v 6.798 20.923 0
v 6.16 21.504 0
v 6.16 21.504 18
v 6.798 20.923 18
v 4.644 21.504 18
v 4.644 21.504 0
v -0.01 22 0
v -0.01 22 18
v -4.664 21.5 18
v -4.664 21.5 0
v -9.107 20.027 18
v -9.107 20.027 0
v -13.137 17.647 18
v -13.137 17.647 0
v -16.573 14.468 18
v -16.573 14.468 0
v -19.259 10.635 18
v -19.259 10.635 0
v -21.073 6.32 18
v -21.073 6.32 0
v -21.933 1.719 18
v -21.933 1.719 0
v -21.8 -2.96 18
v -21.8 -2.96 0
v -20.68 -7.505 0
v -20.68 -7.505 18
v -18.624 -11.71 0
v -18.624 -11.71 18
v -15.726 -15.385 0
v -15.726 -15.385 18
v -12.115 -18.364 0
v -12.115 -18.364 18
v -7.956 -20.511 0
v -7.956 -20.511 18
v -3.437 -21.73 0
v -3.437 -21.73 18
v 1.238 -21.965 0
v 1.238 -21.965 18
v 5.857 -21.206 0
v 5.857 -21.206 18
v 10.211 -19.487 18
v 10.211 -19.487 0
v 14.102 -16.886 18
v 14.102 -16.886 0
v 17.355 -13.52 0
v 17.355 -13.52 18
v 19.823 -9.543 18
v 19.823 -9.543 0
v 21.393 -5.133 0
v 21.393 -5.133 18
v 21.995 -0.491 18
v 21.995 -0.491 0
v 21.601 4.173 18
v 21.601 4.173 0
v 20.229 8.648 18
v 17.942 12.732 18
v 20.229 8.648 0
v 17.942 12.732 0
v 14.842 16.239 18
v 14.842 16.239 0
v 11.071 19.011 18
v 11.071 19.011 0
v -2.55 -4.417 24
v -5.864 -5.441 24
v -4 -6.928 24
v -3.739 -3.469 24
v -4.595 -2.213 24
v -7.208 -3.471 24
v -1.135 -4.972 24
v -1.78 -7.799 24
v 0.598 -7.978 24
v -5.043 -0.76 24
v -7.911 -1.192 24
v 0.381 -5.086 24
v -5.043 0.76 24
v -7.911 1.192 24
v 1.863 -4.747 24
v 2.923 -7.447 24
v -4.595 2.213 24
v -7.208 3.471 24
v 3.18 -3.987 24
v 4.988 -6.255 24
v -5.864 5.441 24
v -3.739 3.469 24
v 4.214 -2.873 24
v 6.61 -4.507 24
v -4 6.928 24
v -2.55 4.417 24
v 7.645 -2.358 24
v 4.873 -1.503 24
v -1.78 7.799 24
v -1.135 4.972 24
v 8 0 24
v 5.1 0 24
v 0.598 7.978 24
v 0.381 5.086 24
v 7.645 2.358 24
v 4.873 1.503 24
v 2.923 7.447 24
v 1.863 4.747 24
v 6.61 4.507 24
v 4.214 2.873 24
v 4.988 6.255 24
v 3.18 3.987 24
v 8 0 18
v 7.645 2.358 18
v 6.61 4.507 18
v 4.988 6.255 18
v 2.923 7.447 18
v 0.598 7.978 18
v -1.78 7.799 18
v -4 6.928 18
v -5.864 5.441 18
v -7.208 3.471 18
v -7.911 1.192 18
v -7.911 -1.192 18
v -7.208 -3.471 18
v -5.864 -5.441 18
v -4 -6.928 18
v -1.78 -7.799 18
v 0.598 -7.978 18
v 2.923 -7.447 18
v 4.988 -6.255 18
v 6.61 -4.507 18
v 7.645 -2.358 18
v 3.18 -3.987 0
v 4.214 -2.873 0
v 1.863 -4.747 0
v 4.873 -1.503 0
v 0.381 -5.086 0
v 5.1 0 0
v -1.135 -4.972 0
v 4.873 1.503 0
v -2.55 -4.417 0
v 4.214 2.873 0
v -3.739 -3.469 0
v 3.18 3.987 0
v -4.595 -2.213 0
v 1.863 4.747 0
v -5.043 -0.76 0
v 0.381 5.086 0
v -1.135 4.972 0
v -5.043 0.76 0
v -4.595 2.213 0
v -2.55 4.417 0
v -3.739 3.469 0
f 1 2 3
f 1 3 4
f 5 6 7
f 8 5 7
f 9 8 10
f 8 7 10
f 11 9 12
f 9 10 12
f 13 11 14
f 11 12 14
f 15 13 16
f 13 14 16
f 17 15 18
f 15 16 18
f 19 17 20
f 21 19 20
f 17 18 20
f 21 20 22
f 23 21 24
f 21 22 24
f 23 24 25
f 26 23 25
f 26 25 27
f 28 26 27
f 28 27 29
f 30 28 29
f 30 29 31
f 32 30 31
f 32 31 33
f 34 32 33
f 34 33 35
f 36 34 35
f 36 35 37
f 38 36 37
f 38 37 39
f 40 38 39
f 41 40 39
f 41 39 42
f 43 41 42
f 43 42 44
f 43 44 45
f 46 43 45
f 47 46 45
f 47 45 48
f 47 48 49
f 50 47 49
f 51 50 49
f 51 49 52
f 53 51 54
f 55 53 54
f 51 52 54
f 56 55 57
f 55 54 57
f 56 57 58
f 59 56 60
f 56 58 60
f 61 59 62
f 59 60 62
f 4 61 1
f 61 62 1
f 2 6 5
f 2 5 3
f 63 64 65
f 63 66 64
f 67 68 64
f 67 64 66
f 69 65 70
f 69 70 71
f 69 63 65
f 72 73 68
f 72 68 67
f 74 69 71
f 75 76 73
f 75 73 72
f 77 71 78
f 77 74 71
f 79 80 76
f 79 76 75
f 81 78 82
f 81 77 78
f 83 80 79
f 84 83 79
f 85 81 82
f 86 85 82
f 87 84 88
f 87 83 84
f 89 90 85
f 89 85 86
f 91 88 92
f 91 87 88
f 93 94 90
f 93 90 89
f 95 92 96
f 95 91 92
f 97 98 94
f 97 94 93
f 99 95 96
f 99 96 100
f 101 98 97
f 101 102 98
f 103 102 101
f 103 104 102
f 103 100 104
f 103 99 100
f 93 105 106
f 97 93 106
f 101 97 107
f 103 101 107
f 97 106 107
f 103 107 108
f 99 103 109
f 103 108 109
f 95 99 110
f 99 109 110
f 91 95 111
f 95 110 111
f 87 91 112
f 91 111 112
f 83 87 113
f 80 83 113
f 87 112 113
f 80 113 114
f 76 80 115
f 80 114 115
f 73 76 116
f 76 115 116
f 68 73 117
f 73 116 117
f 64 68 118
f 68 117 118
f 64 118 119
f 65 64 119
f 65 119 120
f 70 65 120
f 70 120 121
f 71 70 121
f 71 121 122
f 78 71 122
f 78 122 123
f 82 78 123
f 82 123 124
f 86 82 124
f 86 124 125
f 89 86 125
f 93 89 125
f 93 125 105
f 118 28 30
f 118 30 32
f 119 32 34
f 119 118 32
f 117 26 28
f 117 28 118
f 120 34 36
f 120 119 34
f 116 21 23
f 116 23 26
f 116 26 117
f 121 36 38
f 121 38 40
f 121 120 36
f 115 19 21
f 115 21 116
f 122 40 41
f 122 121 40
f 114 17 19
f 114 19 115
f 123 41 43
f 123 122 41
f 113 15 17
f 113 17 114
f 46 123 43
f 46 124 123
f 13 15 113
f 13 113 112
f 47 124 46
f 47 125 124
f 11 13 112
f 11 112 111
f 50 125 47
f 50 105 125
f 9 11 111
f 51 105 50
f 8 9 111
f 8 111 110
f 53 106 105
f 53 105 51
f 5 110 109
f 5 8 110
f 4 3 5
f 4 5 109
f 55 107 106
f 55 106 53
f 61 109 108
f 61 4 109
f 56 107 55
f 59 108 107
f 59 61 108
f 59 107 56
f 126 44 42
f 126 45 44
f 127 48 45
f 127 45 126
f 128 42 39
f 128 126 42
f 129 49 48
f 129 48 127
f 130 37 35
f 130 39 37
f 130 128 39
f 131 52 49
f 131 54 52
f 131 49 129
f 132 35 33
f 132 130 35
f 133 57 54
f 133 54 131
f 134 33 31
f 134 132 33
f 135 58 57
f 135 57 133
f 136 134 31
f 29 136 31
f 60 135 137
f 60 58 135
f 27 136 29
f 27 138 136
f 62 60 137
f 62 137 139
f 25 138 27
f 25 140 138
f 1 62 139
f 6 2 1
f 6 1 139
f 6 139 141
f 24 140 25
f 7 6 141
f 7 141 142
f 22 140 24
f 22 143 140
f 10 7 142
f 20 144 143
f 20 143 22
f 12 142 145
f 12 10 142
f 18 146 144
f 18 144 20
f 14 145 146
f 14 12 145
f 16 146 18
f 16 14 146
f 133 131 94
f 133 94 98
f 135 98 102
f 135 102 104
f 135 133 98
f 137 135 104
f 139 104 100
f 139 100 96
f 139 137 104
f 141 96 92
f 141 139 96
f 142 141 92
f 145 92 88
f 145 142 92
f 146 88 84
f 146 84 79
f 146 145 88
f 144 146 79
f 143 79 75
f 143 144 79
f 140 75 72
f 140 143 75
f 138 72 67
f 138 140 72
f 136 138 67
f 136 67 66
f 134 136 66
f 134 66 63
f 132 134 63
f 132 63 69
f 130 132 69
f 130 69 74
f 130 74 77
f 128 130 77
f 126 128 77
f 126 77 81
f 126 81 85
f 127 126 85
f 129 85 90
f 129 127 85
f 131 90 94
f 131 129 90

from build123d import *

# Parameters (mm, degrees)
SKETCH_1_R      = 8
SKETCH_1_R_2    = 5.1
EXTRUDE_1_DEPTH = 24
SKETCH_1_2_R    = 8
SKETCH_1_2_R_2  = 5.1
EXTRUDE_2_DEPTH = 24
SKETCH_2_R      = 22
SKETCH_2_R_2    = 8
EXTRUDE_3_DEPTH = 18
EXTRUDE_5_DEPTH = 18
EXTRUDE_6_DEPTH = 18
EXTRUDE_7_DEPTH = 18
EXTRUDE_8_DEPTH = 18


with BuildPart() as part:
    # 草图1 → 凸台-拉伸1 (new body)
    with BuildSketch(Plane.XY):
        Circle(SKETCH_1_R)
        Circle(SKETCH_1_R_2, mode=Mode.SUBTRACT)
    extrude(amount=EXTRUDE_1_DEPTH)

    # 草图1<2> → 凸台-拉伸2 (add)
    with BuildSketch(Plane.XY):
        Circle(SKETCH_1_2_R)
        Circle(SKETCH_1_2_R_2, mode=Mode.SUBTRACT)
    extrude(amount=EXTRUDE_2_DEPTH)

    # 草图2 → 凸台-拉伸3 (add)
    with BuildSketch(Plane.XY):
        Circle(SKETCH_2_R)
        Circle(SKETCH_2_R_2, mode=Mode.SUBTRACT)
    extrude(amount=EXTRUDE_3_DEPTH)

    # 草图4 → 凸台-拉伸5 (add)
    with BuildSketch(Plane.XY):
        with BuildLine():
            Line((16.379966987, 6.160087784), (20.591958498, 7.744110358))
            Line((20.591958498, 7.744110358), (20.762986314, 7.27312858))
            Line((20.762986314, 7.27312858), (20.923243358, 6.798373876))
            Line((20.923243358, 6.798373876), (21.072646499, 6.320092525))
            Line((21.072646499, 6.320092525), (21.211118232, 5.838532635))
            Line((21.211118232, 5.838532635), (16.872480412, 4.644287323))
            ThreePointArc((16.872480412, 4.644287323), (16.643489035, 5.407797402), (16.379966987, 6.160087784))
        make_face()
    extrude(amount=EXTRUDE_5_DEPTH)

    # 草图5 → 凸台-拉伸6 (add)
    with BuildSketch(Plane.XY):
        with BuildLine():
            Line((13.674702527, 10.920279795), (17.191054606, 13.728351742))
            Line((17.191054606, 13.728351742), (17.499253098, 13.333271955))
            Line((17.499253098, 13.333271955), (17.798373876, 12.93127555))
            Line((17.798373876, 12.93127555), (18.088261772, 12.522571065))
            Line((18.088261772, 12.522571065), (18.368766406, 12.107370512))
            Line((18.368766406, 12.107370512), (14.611518732, 9.630862907))
            ThreePointArc((14.611518732, 9.630862907), (14.157797402, 10.286241915), (13.674702527, 10.920279795))
        make_face()
    extrude(amount=EXTRUDE_6_DEPTH)

    # 草图6 → 凸台-拉伸7 (add)
    with BuildSketch(Plane.XY):
        with BuildLine():
            Line((9.630862907, 14.611518732), (12.107370512, 18.368766406))
            Line((12.107370512, 18.368766406), (12.522571065, 18.088261772))
            Line((12.522571065, 18.088261772), (12.93127555, 17.798373876))
            Line((12.93127555, 17.798373876), (13.333271955, 17.499253098))
            Line((13.333271955, 17.499253098), (13.728351742, 17.191054606))
            Line((13.728351742, 17.191054606), (10.920279795, 13.674702527))
            ThreePointArc((10.920279795, 13.674702527), (10.286241915, 14.157797402), (9.630862907, 14.611518732))
        make_face()
    extrude(amount=EXTRUDE_7_DEPTH)

    # 草图7 → 凸台-拉伸8 (add)
    with BuildSketch(Plane.XY):
        with BuildLine():
            Line((4.644287323, 16.872480412), (4.644287323, 21.50419948))
            Line((4.644287323, 21.50419948), (6.160087784, 21.50419948))
            Line((6.160087784, 21.50419948), (6.798373876, 20.923243358))
            Line((6.798373876, 20.923243358), (7.27312858, 20.762986314))
            Line((7.27312858, 20.762986314), (7.744110358, 20.591958498))
            Line((7.744110358, 20.591958498), (6.160087784, 16.379966987))
            ThreePointArc((6.160087784, 16.379966987), (5.407797402, 16.643489035), (4.644287323, 16.872480412))
        make_face()
    extrude(amount=EXTRUDE_8_DEPTH)


solid = part.part
